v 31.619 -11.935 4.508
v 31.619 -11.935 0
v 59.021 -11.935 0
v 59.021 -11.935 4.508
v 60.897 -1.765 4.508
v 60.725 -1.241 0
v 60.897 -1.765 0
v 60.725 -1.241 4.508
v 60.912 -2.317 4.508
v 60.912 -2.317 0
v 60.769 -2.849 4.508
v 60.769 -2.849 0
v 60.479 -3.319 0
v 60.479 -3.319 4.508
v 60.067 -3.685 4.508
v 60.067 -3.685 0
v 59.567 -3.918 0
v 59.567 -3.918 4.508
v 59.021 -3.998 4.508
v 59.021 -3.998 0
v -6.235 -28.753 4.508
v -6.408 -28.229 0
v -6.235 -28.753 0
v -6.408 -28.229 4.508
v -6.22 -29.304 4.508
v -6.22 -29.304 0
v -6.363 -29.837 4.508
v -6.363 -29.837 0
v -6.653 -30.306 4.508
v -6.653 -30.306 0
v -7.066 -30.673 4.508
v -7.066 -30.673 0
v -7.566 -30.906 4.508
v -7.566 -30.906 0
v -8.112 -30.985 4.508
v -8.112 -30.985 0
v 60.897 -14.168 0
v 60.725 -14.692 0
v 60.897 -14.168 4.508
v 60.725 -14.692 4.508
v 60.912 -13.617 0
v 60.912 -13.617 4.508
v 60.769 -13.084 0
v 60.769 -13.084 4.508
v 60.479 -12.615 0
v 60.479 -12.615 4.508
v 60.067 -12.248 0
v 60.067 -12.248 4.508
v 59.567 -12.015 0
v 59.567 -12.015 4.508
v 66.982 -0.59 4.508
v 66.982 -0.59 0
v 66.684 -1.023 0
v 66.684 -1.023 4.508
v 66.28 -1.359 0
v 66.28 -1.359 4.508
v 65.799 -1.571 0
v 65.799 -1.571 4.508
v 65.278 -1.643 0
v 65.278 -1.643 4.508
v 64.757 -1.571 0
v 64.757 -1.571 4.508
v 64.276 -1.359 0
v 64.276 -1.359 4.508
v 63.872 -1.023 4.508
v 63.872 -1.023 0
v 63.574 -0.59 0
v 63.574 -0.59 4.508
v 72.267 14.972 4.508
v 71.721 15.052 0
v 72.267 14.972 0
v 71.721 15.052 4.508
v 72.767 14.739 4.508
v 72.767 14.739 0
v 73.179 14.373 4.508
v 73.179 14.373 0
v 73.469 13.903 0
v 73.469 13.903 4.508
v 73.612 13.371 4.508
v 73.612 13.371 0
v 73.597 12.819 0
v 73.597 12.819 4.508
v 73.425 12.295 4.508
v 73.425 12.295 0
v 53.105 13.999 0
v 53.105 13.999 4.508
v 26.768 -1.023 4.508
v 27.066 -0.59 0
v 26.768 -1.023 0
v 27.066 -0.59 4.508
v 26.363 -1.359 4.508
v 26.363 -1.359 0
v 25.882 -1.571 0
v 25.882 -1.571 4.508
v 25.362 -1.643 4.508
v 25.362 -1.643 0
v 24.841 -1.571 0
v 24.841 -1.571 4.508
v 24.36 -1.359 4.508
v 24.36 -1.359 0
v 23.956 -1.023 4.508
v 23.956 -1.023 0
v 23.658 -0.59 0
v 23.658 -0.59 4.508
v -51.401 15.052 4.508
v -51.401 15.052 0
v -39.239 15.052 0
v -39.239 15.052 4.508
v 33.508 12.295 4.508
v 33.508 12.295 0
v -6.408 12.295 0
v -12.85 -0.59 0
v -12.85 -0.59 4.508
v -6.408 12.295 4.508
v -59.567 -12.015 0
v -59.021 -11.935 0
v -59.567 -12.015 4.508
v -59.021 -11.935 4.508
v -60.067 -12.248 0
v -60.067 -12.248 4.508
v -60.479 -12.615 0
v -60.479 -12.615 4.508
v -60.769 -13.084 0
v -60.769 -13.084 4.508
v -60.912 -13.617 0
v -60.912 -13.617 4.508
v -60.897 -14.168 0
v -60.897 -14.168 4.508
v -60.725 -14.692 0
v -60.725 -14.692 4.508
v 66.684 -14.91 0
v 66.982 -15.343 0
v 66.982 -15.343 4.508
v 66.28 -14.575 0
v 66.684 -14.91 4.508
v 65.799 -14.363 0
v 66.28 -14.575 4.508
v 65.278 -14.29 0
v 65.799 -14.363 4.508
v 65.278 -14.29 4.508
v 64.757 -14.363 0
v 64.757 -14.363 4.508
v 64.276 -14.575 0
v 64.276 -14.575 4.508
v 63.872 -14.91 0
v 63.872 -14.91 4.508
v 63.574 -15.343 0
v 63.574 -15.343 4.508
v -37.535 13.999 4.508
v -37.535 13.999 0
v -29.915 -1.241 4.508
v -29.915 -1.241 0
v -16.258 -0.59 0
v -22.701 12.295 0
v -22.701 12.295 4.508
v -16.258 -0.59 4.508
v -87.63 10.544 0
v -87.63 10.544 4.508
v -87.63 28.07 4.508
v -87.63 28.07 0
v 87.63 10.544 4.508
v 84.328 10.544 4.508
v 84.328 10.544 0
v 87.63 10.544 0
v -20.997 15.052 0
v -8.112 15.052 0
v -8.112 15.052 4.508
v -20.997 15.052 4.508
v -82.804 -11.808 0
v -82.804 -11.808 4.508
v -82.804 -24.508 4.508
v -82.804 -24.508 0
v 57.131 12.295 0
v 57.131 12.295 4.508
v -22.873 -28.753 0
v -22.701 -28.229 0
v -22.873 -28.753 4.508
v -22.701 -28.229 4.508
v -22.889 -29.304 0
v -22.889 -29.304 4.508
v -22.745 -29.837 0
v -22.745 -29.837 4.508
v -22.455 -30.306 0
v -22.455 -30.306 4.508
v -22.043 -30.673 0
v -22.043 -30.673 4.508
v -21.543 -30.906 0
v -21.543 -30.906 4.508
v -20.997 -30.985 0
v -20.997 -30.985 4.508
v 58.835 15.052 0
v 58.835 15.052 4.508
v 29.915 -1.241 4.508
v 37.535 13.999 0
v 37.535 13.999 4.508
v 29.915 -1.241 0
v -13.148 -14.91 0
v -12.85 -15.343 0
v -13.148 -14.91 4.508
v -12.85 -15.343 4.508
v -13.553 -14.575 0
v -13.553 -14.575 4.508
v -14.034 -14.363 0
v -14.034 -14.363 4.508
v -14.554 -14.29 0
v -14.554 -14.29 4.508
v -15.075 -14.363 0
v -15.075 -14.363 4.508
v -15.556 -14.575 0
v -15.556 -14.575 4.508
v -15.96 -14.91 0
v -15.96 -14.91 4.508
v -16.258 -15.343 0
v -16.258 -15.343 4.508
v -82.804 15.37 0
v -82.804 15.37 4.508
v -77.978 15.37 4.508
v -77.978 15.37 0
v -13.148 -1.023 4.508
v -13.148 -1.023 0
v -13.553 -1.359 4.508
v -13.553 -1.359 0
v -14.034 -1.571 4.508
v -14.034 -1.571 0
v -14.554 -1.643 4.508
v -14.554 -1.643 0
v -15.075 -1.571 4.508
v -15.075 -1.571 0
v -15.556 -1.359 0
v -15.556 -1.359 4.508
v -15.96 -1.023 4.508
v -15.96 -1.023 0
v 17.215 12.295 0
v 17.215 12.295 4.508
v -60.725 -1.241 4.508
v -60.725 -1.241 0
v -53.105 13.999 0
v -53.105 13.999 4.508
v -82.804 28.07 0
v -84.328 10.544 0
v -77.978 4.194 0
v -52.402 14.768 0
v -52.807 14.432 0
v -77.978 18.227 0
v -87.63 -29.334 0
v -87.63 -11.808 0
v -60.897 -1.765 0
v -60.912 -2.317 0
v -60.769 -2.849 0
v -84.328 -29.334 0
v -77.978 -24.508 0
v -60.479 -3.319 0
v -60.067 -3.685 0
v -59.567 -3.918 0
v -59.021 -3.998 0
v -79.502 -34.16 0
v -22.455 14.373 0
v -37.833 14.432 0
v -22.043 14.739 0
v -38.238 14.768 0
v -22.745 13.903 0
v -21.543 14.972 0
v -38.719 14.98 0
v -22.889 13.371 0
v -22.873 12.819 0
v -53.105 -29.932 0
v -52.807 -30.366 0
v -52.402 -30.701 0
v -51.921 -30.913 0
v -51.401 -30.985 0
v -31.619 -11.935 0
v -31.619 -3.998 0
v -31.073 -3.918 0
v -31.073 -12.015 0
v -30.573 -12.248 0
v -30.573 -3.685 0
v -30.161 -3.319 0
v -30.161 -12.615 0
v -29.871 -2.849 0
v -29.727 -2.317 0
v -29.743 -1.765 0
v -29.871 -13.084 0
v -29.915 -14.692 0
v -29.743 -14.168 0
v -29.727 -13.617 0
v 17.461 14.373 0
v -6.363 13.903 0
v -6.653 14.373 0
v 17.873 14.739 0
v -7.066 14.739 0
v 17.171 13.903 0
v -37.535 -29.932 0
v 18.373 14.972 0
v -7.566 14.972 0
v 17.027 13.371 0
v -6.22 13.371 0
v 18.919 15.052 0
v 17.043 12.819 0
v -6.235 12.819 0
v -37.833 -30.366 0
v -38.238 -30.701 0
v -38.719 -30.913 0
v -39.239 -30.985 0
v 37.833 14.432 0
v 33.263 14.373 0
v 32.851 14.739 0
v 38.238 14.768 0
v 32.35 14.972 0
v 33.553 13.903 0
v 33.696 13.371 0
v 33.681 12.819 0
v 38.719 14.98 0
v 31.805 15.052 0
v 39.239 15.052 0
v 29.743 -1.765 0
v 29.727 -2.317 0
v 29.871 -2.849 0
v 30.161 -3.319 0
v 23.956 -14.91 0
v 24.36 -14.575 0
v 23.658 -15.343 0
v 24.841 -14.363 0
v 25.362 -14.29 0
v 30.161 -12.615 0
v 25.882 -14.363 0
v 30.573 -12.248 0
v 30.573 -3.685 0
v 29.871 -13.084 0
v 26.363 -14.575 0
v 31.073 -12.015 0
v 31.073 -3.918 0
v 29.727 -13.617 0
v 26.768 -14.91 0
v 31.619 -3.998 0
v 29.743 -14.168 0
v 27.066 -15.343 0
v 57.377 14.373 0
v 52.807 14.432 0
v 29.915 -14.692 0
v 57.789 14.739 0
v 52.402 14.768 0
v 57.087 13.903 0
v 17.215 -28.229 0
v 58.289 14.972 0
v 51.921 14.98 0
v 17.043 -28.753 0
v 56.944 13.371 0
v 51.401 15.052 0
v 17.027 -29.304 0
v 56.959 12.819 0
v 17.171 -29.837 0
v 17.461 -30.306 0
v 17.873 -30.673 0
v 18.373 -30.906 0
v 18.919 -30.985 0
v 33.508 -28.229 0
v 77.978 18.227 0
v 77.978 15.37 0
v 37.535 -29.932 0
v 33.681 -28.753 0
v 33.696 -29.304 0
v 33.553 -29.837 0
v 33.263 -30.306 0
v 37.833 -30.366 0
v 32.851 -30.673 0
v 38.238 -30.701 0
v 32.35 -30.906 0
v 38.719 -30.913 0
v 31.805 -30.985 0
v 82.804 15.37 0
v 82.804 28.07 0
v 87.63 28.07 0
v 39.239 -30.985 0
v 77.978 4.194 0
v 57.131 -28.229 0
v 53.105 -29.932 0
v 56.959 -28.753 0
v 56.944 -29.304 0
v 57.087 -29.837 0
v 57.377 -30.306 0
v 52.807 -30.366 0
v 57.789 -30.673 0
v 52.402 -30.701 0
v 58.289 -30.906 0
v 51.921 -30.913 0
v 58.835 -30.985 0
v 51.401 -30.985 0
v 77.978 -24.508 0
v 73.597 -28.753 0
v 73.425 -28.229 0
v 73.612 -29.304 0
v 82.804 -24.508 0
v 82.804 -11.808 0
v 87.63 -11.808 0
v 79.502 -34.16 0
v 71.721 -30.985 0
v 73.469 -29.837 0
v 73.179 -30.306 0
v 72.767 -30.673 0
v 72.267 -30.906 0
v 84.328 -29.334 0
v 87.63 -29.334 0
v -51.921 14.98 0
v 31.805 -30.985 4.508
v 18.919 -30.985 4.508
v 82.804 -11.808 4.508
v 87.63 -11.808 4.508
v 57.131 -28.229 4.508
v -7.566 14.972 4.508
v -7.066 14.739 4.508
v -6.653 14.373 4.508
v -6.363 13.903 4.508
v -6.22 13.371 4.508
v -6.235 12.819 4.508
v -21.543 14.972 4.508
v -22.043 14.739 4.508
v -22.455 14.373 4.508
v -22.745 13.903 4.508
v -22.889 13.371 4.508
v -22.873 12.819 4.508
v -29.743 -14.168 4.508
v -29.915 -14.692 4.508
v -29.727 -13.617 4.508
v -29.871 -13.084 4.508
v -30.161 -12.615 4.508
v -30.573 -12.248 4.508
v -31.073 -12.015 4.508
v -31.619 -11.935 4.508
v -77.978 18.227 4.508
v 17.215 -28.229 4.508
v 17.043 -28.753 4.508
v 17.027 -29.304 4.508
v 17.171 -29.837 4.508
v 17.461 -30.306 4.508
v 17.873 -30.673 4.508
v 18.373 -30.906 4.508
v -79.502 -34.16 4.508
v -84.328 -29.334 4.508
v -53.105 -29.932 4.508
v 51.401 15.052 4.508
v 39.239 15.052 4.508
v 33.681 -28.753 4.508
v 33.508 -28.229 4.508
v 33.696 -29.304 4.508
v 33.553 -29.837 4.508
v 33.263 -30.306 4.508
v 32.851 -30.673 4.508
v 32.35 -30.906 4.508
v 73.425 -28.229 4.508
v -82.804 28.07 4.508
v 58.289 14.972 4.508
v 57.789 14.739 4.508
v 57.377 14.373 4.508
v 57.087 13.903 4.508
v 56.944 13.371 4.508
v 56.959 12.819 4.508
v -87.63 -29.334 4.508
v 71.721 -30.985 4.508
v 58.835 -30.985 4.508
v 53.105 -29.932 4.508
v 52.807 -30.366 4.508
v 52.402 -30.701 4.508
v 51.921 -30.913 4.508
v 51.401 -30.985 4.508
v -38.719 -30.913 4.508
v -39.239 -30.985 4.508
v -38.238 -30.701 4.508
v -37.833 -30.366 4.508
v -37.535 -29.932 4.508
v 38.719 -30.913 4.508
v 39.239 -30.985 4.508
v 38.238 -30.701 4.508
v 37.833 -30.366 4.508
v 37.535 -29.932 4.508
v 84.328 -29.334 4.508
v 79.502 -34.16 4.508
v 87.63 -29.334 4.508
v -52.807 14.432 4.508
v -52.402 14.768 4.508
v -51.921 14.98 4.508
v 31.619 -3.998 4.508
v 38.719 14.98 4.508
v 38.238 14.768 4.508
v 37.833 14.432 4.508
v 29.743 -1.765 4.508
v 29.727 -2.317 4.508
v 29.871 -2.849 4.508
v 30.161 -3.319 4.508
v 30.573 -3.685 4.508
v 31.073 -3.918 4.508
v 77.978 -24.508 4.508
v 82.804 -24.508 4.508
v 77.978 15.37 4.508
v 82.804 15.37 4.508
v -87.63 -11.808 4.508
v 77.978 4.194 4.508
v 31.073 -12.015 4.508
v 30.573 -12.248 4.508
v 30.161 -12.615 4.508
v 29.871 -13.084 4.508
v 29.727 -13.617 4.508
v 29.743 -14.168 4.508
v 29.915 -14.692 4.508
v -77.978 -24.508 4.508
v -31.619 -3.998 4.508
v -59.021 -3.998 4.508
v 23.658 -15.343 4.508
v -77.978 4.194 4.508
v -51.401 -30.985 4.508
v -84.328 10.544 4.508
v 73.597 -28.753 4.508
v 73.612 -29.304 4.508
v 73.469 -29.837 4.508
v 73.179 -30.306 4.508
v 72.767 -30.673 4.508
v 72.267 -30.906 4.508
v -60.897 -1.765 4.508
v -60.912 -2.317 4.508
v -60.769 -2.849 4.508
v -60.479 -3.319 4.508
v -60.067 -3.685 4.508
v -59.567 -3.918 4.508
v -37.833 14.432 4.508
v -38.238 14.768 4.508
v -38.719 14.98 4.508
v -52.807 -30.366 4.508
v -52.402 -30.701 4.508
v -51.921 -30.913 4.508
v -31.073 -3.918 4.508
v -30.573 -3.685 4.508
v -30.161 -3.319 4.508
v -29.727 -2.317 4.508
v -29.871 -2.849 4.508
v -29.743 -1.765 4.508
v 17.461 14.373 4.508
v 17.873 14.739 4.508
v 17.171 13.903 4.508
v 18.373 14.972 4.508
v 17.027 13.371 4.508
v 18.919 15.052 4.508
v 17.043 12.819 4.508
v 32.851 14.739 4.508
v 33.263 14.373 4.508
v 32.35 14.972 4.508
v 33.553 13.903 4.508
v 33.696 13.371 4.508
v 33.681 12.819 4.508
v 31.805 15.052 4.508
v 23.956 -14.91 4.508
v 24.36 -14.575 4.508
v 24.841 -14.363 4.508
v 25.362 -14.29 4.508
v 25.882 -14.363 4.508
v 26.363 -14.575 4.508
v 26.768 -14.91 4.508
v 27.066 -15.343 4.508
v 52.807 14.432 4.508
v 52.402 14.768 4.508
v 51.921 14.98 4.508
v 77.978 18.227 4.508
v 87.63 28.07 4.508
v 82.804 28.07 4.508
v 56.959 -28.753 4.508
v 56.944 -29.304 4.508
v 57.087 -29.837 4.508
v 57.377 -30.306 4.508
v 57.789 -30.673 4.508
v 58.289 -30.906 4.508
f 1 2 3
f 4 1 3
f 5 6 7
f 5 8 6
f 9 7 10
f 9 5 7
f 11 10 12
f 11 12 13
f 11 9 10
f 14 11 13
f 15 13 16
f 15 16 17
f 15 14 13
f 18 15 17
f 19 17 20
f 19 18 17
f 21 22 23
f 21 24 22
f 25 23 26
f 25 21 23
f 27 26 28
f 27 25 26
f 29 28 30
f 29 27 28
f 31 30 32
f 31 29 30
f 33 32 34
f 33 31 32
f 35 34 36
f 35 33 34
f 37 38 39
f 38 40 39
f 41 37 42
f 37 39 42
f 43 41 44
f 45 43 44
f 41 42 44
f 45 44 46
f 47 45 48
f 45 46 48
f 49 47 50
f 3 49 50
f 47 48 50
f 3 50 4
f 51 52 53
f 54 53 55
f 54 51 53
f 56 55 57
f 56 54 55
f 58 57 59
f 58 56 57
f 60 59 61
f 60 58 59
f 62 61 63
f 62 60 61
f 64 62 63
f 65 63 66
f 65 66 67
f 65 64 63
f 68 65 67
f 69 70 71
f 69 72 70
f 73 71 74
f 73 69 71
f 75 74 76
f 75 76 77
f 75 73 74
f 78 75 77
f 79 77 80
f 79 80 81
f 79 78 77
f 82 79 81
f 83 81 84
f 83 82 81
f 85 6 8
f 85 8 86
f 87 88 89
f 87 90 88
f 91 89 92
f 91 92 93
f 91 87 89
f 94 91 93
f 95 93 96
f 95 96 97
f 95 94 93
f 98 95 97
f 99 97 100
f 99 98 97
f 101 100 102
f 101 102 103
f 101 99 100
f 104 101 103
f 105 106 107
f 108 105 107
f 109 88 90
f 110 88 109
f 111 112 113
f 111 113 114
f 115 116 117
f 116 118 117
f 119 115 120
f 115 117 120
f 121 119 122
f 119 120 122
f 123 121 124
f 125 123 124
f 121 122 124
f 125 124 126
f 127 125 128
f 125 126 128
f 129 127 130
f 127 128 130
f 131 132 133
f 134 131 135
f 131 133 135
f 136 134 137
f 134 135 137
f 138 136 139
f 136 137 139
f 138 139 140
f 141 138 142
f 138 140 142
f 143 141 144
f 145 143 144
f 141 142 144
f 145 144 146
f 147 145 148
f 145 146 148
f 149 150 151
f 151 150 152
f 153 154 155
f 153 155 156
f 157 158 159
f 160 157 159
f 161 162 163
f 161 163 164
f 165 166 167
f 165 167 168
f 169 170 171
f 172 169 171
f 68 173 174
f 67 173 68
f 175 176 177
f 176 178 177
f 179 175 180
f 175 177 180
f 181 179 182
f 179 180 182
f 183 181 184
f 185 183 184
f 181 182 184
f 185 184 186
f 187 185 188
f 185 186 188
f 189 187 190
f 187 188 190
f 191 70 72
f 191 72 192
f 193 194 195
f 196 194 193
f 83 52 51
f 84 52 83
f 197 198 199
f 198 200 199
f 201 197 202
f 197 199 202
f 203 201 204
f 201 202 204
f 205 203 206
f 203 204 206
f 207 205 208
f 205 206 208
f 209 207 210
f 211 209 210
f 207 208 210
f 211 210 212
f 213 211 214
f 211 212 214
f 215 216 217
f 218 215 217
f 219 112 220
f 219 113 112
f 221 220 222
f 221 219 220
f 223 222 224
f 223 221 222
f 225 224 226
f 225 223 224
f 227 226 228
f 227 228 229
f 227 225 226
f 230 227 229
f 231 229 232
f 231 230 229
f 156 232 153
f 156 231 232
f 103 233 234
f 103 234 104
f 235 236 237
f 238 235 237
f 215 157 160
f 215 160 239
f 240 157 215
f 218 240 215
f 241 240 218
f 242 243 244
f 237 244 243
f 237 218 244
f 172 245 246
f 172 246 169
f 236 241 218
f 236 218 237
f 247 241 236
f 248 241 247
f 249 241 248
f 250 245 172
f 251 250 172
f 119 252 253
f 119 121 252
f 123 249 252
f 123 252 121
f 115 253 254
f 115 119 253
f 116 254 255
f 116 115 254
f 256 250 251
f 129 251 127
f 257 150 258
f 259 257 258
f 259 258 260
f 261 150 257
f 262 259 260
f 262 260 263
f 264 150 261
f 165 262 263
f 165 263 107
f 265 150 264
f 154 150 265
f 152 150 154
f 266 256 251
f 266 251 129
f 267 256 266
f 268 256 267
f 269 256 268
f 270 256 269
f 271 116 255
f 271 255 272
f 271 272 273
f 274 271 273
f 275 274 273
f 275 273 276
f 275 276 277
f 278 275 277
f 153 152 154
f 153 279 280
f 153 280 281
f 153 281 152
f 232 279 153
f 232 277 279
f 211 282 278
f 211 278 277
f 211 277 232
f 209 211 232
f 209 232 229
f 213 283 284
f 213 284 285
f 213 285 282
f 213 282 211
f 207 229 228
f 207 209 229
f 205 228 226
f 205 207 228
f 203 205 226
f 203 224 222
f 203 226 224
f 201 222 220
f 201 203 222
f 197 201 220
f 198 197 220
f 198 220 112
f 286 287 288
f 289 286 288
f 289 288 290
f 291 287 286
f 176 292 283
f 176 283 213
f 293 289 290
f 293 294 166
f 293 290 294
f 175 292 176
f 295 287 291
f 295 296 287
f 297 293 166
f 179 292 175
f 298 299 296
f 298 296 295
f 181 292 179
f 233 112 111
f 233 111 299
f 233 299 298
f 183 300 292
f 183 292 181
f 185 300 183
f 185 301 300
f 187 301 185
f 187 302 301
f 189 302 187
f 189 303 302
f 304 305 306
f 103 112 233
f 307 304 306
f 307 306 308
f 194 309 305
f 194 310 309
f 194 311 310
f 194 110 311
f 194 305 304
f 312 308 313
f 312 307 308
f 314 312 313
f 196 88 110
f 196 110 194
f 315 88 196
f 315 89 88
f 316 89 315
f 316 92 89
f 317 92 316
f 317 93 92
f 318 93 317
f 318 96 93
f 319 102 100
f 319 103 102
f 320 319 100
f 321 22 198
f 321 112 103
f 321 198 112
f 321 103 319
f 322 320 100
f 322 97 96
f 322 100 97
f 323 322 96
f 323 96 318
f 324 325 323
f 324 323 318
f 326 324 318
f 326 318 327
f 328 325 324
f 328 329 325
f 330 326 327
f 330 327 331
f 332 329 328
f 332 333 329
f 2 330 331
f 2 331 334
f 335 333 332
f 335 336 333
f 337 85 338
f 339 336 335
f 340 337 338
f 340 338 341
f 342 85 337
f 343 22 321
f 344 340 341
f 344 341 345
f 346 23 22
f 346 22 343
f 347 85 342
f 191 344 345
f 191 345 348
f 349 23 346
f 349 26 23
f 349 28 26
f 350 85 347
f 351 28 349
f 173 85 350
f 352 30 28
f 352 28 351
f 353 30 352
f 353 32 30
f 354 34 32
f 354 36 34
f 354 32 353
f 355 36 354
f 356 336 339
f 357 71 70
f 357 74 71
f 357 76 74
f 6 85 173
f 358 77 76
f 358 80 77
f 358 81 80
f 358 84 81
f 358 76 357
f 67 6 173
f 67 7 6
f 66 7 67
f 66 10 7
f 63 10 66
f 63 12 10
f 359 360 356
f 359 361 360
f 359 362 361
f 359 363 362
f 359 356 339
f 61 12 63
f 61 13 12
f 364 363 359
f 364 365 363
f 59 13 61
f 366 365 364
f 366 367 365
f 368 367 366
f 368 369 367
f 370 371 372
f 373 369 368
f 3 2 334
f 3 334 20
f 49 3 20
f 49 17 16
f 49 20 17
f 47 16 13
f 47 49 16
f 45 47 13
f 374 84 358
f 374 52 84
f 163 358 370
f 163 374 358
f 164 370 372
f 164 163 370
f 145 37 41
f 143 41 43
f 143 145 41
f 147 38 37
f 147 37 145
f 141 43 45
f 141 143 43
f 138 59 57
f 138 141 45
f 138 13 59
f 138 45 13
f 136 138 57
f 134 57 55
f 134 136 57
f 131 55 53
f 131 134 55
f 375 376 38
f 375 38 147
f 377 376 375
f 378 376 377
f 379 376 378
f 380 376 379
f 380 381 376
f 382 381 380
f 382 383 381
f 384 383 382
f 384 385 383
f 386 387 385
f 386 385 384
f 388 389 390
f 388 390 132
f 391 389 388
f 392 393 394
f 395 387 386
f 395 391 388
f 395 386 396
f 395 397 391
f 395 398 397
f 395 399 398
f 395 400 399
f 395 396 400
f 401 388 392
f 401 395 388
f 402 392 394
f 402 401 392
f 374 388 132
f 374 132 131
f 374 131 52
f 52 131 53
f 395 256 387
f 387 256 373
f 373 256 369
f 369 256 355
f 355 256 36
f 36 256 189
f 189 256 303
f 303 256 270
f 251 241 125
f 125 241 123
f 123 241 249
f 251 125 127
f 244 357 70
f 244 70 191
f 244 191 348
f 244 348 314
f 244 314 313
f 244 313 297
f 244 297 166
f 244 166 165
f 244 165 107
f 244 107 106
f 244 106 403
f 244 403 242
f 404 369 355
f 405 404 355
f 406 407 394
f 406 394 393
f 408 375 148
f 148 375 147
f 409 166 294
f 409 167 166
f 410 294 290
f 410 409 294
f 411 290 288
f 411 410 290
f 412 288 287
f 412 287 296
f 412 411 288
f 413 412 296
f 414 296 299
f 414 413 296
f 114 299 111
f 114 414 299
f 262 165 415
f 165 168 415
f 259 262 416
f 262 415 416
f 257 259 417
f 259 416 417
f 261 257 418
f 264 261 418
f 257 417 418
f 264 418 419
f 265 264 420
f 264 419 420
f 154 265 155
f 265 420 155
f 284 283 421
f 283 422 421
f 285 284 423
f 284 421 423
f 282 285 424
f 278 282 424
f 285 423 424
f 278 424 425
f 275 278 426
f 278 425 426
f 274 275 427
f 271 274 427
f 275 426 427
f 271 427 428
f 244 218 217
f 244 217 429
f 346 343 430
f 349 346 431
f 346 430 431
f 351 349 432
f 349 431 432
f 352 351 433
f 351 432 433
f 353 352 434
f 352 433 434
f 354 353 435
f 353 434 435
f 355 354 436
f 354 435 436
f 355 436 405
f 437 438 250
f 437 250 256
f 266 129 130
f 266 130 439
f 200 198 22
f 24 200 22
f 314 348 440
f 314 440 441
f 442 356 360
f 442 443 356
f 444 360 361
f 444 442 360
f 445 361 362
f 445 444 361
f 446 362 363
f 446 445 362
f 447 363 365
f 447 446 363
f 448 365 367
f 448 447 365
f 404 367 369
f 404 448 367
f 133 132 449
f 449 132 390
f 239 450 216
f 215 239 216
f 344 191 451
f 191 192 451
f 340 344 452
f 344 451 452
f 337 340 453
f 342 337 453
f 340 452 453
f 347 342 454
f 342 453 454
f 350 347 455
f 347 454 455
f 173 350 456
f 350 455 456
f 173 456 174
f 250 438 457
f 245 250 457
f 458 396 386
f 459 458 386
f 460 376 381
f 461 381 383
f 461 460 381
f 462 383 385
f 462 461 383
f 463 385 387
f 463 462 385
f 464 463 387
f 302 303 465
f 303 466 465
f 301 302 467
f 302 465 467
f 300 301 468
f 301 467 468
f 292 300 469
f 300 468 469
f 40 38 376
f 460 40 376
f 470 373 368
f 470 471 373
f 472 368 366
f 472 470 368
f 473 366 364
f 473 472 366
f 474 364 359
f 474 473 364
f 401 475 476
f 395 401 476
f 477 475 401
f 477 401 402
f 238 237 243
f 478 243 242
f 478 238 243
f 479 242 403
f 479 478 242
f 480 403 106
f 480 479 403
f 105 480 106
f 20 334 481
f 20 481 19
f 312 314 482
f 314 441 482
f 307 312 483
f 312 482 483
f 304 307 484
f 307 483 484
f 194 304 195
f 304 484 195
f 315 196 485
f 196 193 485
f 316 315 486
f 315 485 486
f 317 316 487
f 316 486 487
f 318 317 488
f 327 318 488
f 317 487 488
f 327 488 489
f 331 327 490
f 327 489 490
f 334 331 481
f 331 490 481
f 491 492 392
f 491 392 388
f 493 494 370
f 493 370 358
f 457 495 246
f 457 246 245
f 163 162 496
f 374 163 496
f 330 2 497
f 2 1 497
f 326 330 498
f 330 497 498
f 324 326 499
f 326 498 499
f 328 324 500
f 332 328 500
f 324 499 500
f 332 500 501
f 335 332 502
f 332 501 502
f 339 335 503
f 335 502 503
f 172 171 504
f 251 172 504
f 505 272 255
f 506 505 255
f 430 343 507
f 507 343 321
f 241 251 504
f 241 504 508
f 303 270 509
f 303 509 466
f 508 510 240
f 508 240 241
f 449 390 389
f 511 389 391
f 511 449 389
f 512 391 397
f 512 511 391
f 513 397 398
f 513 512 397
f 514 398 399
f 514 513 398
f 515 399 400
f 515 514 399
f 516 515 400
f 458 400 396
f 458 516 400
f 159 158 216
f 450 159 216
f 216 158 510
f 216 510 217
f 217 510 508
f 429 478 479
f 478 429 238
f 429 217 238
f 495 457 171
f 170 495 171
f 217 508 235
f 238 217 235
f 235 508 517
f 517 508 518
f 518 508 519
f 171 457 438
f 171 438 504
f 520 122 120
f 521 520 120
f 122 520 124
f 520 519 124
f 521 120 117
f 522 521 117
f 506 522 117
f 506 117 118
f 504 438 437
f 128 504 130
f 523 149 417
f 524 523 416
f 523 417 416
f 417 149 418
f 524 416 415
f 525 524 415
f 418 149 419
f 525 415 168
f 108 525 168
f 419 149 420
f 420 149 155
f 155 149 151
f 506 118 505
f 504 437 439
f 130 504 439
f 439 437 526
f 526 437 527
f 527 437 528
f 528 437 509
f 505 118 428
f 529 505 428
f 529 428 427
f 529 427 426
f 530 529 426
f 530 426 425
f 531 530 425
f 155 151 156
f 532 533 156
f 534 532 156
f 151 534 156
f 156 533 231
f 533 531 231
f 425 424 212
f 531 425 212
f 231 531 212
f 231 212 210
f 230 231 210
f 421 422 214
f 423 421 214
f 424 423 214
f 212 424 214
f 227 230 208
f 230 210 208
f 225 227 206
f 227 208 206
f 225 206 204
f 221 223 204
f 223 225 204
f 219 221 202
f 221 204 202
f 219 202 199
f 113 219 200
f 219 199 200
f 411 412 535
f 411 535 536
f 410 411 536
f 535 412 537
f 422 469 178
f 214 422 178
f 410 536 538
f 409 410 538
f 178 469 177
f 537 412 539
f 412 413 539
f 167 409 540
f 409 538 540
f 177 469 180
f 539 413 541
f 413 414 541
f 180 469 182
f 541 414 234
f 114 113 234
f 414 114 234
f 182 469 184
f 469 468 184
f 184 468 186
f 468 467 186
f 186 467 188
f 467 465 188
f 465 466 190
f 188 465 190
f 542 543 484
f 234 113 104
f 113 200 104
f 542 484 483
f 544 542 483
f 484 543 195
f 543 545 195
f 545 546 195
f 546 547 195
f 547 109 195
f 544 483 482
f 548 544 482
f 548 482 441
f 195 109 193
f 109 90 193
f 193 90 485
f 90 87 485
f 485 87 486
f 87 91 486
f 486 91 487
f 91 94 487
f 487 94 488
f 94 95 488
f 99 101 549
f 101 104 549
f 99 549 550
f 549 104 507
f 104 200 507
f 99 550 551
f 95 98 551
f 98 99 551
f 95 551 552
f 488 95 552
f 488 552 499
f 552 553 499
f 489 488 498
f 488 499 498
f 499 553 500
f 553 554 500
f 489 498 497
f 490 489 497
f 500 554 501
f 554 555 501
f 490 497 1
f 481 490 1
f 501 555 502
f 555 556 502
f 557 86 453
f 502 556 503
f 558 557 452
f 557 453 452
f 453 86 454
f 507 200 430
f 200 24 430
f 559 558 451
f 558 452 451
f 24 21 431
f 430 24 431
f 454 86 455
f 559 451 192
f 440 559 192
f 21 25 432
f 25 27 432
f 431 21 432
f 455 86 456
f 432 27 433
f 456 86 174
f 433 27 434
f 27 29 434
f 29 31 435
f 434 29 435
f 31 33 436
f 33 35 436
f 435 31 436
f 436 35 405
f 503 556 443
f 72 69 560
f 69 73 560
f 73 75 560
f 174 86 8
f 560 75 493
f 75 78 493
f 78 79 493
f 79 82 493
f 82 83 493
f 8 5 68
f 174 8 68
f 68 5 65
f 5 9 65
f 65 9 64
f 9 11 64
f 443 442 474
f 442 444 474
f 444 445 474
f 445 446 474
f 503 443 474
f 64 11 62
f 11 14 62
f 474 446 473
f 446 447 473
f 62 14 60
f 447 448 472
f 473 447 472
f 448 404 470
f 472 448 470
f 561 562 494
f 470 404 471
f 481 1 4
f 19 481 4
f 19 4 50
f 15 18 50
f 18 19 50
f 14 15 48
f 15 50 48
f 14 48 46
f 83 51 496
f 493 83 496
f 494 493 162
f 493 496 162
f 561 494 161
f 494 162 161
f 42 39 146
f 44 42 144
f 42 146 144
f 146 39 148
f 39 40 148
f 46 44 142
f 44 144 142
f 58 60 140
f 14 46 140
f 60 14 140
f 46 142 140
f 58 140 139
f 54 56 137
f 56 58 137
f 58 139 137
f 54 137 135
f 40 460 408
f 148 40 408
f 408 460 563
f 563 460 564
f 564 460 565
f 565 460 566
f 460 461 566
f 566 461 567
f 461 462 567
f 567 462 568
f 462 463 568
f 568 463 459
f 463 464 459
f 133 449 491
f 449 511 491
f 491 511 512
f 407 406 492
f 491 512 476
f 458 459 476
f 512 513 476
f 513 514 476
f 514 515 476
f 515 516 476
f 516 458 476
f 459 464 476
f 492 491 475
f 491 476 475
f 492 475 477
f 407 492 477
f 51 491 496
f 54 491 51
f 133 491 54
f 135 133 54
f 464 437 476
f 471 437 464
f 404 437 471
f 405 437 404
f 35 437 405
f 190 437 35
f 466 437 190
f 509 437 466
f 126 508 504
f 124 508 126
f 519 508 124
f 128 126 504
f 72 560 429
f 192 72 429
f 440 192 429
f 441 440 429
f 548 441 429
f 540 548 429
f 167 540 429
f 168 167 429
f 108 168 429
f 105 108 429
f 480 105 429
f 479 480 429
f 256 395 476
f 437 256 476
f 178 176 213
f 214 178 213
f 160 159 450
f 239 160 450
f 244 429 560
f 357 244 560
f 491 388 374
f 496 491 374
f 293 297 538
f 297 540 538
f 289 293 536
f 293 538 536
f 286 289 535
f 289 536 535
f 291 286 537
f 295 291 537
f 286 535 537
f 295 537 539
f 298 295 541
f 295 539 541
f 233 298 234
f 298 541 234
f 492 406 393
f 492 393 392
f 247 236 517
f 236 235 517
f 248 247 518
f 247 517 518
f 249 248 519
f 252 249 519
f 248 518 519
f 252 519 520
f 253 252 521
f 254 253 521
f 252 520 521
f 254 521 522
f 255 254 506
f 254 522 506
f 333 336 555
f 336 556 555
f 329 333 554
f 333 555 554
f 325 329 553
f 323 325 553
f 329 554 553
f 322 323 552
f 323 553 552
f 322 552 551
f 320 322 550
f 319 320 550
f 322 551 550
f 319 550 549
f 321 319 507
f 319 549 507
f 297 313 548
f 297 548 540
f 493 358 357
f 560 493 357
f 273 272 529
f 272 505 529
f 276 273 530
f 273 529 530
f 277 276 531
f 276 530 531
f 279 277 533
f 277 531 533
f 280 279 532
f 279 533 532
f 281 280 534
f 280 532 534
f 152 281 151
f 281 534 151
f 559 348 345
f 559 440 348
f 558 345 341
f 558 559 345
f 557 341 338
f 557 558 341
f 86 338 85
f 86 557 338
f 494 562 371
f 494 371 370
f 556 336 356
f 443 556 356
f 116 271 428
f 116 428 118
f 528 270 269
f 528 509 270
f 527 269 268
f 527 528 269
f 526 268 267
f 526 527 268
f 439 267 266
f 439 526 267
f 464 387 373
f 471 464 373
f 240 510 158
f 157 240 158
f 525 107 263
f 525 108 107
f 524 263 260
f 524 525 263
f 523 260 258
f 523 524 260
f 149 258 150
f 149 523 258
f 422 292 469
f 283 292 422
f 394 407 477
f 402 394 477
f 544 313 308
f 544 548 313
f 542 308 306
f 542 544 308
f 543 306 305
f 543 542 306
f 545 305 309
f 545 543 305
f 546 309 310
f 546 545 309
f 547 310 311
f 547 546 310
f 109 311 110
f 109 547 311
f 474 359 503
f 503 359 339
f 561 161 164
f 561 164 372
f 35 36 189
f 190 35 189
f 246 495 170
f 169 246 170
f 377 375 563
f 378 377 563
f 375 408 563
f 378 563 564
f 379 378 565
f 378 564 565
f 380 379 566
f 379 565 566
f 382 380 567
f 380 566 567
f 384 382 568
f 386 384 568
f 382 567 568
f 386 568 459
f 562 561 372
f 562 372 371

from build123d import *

# Parameters (mm, degrees)
SKETCH1_W            = 155.956
SKETCH1_H            = 68.320954018
BOSS_EXTRUDE1_DEPTH  = 4.5085
SKETCH2_W            = 155.956
SKETCH2_H            = 15.933454036
CUT_EXTRUDE1_DEPTH   = 10.795
BOSS_EXTRUDE2_DEPTH  = 4.5085
CUT_EXTRUDE2_DEPTH   = 4.7625
LPATTERN1_COUNT      = 3
LPATTERN1_PITCH      = 39.916133528
CUT_EXTRUDE3_DEPTH   = 4.7625
FILLET2_R            = 1.905
MIRROR3_COPY_1_DEPTH = 4.7625
MIRROR3_COPY_2_DEPTH = 4.7625
MIRROR3_COPY_3_DEPTH = 4.7625
FILLET3_R            = 1.905
CHAMFER1_SIZE        = 6.35


with BuildPart() as part:
    # Sketch1 → Boss-Extrude1 (new body)
    with BuildSketch(Plane.XY):
        Rectangle(SKETCH1_W, SKETCH1_H)
    extrude(amount=BOSS_EXTRUDE1_DEPTH)

    # Sketch2 → Cut-Extrude1 (cut)
    with BuildSketch(Plane.XY.offset(4.5085)):
        with Locations((0, 26.193749991)):
            Rectangle(SKETCH2_W, SKETCH2_H)
    extrude(amount=-CUT_EXTRUDE1_DEPTH, mode=Mode.SUBTRACT)

    # Sketch3 → Boss-Extrude2 (add)
    with BuildSketch(Plane.XY.offset(4.5085)):
        Polygon((-77.978, -29.334477009), (-87.63, -29.334477009), (-87.63, -25.589053013), (-87.63, -11.808477009), (-82.804, -11.808477009), (-82.804, -24.508477009), (-77.978, -24.508477009), align=None)
        Polygon((-77.978, 10.543522991), (-87.63, 10.543522991), (-87.63, 28.069522991), (-82.804, 28.069522991), (-82.804, 15.369522991), (-77.978, 15.369522991), align=None)
    boss_extrude2 = extrude(amount=-BOSS_EXTRUDE2_DEPTH)

    # Mirror1: Boss-Extrude2 across plane
    add(boss_extrude2.mirror(Plane(origin=(0, 0, 0), x_dir=(0, 0, 1), z_dir=(1, 0, 0))))

    # Sketch4 → Cut-Extrude2 (cut)
    with BuildSketch(Plane(origin=(0, 0, 0), x_dir=(-1, 0, 0), z_dir=(0, 0, -1))):
        Polygon((-74.803, 15.052022991), (-55.753, 15.052022991), (-65.278, -3.997977009), align=None)
    cut_extrude2 = extrude(amount=-CUT_EXTRUDE2_DEPTH, mode=Mode.SUBTRACT)

    # LPattern1: Cut-Extrude2 ×3
    with Locations(*[(-i * LPATTERN1_PITCH, 0, 0) for i in range(1, LPATTERN1_COUNT)]):
        add(cut_extrude2, mode=Mode.SUBTRACT)

    # Sketch5 → Cut-Extrude3 (cut)
    with BuildSketch(Plane(origin=(0, 0, 0), x_dir=(-1, 0, 0), z_dir=(0, 0, -1))):
        Polygon((-52.578, 15.052022991), (-38.061866472, 15.052022991), (-28.536866472, -3.997977009), (-62.103, -3.997977009), align=None)
    cut_extrude3 = extrude(amount=-CUT_EXTRUDE3_DEPTH, mode=Mode.SUBTRACT)

    # Mirror2: Cut-Extrude3 across plane
    add(cut_extrude3.mirror(Plane(origin=(0, 0, 0), x_dir=(0, 0, 1), z_dir=(1, 0, 0))), mode=Mode.SUBTRACT)

    # Fillet2
    fillet2_edges = [part.edges().sort_by_distance(p)[0] for p in [
        (65.278, -3.997977009, 2.25425),
        (74.803, 15.052022991, 2.25425),
        (55.753, 15.052022991, 2.25425),
        (25.361866472, -3.997977009, 2.25425),
        (34.886866472, 15.052022991, 2.25425),
        (15.836866472, 15.052022991, 2.25425),
        (-5.029267056, 15.052022991, 2.25425),
        (-14.554267056, -3.997977009, 2.25425),
        (-24.079267056, 15.052022991, 2.25425),
    ]]
    fillet(fillet2_edges, radius=FILLET2_R)

    # Mirror3: Cut-Extrude2, Cut-Extrude3 across plane
    add(cut_extrude2.mirror(Plane.ZX.offset(-7.966727018)), mode=Mode.SUBTRACT)
    add(cut_extrude3.mirror(Plane.ZX.offset(-7.966727018)), mode=Mode.SUBTRACT)

    # Mirror3 copy 1 sketch → Mirror3 copy 1 (cut)
    with BuildSketch(Plane(origin=(-39.916133528, -15.933454036, 0), x_dir=(-1, 0, 0), z_dir=(0, 0, -1))):
        Polygon((-74.803, -15.052022991), (-55.753, -15.052022991), (-65.278, 3.997977009), align=None)
    extrude(amount=-MIRROR3_COPY_1_DEPTH, mode=Mode.SUBTRACT)

    # Mirror3 copy 2 sketch → Mirror3 copy 2 (cut)
    with BuildSketch(Plane(origin=(-79.832267056, -15.933454036, 0), x_dir=(-1, 0, 0), z_dir=(0, 0, -1))):
        Polygon((-74.803, -15.052022991), (-55.753, -15.052022991), (-65.278, 3.997977009), align=None)
    extrude(amount=-MIRROR3_COPY_2_DEPTH, mode=Mode.SUBTRACT)

    # Mirror3 copy 3 sketch → Mirror3 copy 3 (cut)
    with BuildSketch(Plane(origin=(0, -15.933454036, 0), x_dir=(1, 0, 0), z_dir=(0, 0, -1))):
        Polygon((-52.578, 15.052022991), (-38.061866472, 15.052022991), (-28.536866472, -3.997977009), (-62.103, -3.997977009), align=None)
    extrude(amount=-MIRROR3_COPY_3_DEPTH, mode=Mode.SUBTRACT)

    # Fillet3
    fillet3_edges = [part.edges().sort_by_distance(p)[0] for p in [
        (62.103, -3.997977009, 2.25425),
        (52.578, 15.052022991, 2.25425),
        (38.061866472, 15.052022991, 2.25425),
        (28.536866472, -3.997977009, 2.25425),
        (-52.578, 15.052022991, 2.25425),
        (-62.103, -3.997977009, 2.25425),
        (-28.536866472, -3.997977009, 2.25425),
        (-38.061866472, 15.052022991, 2.25425),
        (74.803, -30.985477027, 2.25425),
        (65.278, -11.935477027, 2.25425),
        (55.753, -30.985477027, 2.25425),
        (34.886866472, -30.985477027, 2.25425),
        (25.361866472, -11.935477027, 2.25425),
        (15.836866472, -30.985477027, 2.25425),
        (-5.029267056, -30.985477027, 2.25425),
        (-14.554267056, -11.935477027, 2.25425),
        (-24.079267056, -30.985477027, 2.25425),
        (-62.103, -11.935477027, 2.25425),
        (-52.578, -30.985477027, 2.25425),
        (-38.061866472, -30.985477027, 2.25425),
        (-28.536866472, -11.935477027, 2.25425),
        (52.578, -30.985477027, 2.25425),
        (62.103, -11.935477027, 2.25425),
        (28.536866472, -11.935477027, 2.25425),
        (38.061866472, -30.985477027, 2.25425),
    ]]
    fillet(fillet3_edges, radius=FILLET3_R)

    # Chamfer1
    # the kernel refuses this chamfer: 6.35 mm, written as the material it adds along each edge
    with BuildSketch(Plane(origin=(-77.978, -29.334477009, 4.5085), x_dir=(-0.9996219169112966, 0.027495876610585696, 0), z_dir=(0, 0, -1))) as chamfer1_piece_1_section:
        Polygon((CHAMFER1_SIZE * 0.999621916911, -CHAMFER1_SIZE * 0.0274958766106), (-CHAMFER1_SIZE * 0.0274958766106, -CHAMFER1_SIZE * 0.999621916911), (0, 0), align=None)
    chamfer1_piece_1 = extrude(amount=4.5085, mode=Mode.PRIVATE)
    chamfer1_piece_1 = split(chamfer1_piece_1, bisect_by=Plane(origin=(-80.204608327, -34.160477009, 2.25425), z_dir=(0, 1, 0)), keep=Keep.TOP, mode=Mode.PRIVATE)
    add(chamfer1_piece_1)
    with BuildSketch(Plane(origin=(-77.978, 10.543522991, 4.5085), x_dir=(-0.9996219169112966, 0.02749587661058624, 0), z_dir=(0, 0, -1))) as chamfer1_piece_2:
        Polygon((CHAMFER1_SIZE * 0.999621916911, -CHAMFER1_SIZE * 0.0274958766106), (-CHAMFER1_SIZE * 0.0274958766106, -CHAMFER1_SIZE * 0.999621916911), (0, 0), align=None)
    extrude(amount=4.5085)
    with BuildSketch(Plane(origin=(77.978, -29.334477009, 4.5085), x_dir=(0.9996219169112966, 0.027495876610585696, 0), z_dir=(0, 0, -1))) as chamfer1_piece_3_section:
        Polygon((CHAMFER1_SIZE * 0.999621916911, CHAMFER1_SIZE * 0.0274958766106), (-CHAMFER1_SIZE * 0.0274958766106, CHAMFER1_SIZE * 0.999621916911), (0, 0), align=None)
    chamfer1_piece_3 = extrude(amount=4.5085, mode=Mode.PRIVATE)
    chamfer1_piece_3 = split(chamfer1_piece_3, bisect_by=Plane(origin=(80.204608327, -34.160477009, 2.25425), z_dir=(0, 1, 0)), keep=Keep.TOP, mode=Mode.PRIVATE)
    add(chamfer1_piece_3)
    with BuildSketch(Plane(origin=(77.978, 10.543522991, 4.5085), x_dir=(0.9996219169112966, 0.027495876610585966, 0), z_dir=(0, 0, -1))) as chamfer1_piece_4:
        Polygon((CHAMFER1_SIZE * 0.999621916911, CHAMFER1_SIZE * 0.0274958766106), (-CHAMFER1_SIZE * 0.0274958766106, CHAMFER1_SIZE * 0.999621916911), (0, 0), align=None)
    extrude(amount=4.5085)


solid = part.part
